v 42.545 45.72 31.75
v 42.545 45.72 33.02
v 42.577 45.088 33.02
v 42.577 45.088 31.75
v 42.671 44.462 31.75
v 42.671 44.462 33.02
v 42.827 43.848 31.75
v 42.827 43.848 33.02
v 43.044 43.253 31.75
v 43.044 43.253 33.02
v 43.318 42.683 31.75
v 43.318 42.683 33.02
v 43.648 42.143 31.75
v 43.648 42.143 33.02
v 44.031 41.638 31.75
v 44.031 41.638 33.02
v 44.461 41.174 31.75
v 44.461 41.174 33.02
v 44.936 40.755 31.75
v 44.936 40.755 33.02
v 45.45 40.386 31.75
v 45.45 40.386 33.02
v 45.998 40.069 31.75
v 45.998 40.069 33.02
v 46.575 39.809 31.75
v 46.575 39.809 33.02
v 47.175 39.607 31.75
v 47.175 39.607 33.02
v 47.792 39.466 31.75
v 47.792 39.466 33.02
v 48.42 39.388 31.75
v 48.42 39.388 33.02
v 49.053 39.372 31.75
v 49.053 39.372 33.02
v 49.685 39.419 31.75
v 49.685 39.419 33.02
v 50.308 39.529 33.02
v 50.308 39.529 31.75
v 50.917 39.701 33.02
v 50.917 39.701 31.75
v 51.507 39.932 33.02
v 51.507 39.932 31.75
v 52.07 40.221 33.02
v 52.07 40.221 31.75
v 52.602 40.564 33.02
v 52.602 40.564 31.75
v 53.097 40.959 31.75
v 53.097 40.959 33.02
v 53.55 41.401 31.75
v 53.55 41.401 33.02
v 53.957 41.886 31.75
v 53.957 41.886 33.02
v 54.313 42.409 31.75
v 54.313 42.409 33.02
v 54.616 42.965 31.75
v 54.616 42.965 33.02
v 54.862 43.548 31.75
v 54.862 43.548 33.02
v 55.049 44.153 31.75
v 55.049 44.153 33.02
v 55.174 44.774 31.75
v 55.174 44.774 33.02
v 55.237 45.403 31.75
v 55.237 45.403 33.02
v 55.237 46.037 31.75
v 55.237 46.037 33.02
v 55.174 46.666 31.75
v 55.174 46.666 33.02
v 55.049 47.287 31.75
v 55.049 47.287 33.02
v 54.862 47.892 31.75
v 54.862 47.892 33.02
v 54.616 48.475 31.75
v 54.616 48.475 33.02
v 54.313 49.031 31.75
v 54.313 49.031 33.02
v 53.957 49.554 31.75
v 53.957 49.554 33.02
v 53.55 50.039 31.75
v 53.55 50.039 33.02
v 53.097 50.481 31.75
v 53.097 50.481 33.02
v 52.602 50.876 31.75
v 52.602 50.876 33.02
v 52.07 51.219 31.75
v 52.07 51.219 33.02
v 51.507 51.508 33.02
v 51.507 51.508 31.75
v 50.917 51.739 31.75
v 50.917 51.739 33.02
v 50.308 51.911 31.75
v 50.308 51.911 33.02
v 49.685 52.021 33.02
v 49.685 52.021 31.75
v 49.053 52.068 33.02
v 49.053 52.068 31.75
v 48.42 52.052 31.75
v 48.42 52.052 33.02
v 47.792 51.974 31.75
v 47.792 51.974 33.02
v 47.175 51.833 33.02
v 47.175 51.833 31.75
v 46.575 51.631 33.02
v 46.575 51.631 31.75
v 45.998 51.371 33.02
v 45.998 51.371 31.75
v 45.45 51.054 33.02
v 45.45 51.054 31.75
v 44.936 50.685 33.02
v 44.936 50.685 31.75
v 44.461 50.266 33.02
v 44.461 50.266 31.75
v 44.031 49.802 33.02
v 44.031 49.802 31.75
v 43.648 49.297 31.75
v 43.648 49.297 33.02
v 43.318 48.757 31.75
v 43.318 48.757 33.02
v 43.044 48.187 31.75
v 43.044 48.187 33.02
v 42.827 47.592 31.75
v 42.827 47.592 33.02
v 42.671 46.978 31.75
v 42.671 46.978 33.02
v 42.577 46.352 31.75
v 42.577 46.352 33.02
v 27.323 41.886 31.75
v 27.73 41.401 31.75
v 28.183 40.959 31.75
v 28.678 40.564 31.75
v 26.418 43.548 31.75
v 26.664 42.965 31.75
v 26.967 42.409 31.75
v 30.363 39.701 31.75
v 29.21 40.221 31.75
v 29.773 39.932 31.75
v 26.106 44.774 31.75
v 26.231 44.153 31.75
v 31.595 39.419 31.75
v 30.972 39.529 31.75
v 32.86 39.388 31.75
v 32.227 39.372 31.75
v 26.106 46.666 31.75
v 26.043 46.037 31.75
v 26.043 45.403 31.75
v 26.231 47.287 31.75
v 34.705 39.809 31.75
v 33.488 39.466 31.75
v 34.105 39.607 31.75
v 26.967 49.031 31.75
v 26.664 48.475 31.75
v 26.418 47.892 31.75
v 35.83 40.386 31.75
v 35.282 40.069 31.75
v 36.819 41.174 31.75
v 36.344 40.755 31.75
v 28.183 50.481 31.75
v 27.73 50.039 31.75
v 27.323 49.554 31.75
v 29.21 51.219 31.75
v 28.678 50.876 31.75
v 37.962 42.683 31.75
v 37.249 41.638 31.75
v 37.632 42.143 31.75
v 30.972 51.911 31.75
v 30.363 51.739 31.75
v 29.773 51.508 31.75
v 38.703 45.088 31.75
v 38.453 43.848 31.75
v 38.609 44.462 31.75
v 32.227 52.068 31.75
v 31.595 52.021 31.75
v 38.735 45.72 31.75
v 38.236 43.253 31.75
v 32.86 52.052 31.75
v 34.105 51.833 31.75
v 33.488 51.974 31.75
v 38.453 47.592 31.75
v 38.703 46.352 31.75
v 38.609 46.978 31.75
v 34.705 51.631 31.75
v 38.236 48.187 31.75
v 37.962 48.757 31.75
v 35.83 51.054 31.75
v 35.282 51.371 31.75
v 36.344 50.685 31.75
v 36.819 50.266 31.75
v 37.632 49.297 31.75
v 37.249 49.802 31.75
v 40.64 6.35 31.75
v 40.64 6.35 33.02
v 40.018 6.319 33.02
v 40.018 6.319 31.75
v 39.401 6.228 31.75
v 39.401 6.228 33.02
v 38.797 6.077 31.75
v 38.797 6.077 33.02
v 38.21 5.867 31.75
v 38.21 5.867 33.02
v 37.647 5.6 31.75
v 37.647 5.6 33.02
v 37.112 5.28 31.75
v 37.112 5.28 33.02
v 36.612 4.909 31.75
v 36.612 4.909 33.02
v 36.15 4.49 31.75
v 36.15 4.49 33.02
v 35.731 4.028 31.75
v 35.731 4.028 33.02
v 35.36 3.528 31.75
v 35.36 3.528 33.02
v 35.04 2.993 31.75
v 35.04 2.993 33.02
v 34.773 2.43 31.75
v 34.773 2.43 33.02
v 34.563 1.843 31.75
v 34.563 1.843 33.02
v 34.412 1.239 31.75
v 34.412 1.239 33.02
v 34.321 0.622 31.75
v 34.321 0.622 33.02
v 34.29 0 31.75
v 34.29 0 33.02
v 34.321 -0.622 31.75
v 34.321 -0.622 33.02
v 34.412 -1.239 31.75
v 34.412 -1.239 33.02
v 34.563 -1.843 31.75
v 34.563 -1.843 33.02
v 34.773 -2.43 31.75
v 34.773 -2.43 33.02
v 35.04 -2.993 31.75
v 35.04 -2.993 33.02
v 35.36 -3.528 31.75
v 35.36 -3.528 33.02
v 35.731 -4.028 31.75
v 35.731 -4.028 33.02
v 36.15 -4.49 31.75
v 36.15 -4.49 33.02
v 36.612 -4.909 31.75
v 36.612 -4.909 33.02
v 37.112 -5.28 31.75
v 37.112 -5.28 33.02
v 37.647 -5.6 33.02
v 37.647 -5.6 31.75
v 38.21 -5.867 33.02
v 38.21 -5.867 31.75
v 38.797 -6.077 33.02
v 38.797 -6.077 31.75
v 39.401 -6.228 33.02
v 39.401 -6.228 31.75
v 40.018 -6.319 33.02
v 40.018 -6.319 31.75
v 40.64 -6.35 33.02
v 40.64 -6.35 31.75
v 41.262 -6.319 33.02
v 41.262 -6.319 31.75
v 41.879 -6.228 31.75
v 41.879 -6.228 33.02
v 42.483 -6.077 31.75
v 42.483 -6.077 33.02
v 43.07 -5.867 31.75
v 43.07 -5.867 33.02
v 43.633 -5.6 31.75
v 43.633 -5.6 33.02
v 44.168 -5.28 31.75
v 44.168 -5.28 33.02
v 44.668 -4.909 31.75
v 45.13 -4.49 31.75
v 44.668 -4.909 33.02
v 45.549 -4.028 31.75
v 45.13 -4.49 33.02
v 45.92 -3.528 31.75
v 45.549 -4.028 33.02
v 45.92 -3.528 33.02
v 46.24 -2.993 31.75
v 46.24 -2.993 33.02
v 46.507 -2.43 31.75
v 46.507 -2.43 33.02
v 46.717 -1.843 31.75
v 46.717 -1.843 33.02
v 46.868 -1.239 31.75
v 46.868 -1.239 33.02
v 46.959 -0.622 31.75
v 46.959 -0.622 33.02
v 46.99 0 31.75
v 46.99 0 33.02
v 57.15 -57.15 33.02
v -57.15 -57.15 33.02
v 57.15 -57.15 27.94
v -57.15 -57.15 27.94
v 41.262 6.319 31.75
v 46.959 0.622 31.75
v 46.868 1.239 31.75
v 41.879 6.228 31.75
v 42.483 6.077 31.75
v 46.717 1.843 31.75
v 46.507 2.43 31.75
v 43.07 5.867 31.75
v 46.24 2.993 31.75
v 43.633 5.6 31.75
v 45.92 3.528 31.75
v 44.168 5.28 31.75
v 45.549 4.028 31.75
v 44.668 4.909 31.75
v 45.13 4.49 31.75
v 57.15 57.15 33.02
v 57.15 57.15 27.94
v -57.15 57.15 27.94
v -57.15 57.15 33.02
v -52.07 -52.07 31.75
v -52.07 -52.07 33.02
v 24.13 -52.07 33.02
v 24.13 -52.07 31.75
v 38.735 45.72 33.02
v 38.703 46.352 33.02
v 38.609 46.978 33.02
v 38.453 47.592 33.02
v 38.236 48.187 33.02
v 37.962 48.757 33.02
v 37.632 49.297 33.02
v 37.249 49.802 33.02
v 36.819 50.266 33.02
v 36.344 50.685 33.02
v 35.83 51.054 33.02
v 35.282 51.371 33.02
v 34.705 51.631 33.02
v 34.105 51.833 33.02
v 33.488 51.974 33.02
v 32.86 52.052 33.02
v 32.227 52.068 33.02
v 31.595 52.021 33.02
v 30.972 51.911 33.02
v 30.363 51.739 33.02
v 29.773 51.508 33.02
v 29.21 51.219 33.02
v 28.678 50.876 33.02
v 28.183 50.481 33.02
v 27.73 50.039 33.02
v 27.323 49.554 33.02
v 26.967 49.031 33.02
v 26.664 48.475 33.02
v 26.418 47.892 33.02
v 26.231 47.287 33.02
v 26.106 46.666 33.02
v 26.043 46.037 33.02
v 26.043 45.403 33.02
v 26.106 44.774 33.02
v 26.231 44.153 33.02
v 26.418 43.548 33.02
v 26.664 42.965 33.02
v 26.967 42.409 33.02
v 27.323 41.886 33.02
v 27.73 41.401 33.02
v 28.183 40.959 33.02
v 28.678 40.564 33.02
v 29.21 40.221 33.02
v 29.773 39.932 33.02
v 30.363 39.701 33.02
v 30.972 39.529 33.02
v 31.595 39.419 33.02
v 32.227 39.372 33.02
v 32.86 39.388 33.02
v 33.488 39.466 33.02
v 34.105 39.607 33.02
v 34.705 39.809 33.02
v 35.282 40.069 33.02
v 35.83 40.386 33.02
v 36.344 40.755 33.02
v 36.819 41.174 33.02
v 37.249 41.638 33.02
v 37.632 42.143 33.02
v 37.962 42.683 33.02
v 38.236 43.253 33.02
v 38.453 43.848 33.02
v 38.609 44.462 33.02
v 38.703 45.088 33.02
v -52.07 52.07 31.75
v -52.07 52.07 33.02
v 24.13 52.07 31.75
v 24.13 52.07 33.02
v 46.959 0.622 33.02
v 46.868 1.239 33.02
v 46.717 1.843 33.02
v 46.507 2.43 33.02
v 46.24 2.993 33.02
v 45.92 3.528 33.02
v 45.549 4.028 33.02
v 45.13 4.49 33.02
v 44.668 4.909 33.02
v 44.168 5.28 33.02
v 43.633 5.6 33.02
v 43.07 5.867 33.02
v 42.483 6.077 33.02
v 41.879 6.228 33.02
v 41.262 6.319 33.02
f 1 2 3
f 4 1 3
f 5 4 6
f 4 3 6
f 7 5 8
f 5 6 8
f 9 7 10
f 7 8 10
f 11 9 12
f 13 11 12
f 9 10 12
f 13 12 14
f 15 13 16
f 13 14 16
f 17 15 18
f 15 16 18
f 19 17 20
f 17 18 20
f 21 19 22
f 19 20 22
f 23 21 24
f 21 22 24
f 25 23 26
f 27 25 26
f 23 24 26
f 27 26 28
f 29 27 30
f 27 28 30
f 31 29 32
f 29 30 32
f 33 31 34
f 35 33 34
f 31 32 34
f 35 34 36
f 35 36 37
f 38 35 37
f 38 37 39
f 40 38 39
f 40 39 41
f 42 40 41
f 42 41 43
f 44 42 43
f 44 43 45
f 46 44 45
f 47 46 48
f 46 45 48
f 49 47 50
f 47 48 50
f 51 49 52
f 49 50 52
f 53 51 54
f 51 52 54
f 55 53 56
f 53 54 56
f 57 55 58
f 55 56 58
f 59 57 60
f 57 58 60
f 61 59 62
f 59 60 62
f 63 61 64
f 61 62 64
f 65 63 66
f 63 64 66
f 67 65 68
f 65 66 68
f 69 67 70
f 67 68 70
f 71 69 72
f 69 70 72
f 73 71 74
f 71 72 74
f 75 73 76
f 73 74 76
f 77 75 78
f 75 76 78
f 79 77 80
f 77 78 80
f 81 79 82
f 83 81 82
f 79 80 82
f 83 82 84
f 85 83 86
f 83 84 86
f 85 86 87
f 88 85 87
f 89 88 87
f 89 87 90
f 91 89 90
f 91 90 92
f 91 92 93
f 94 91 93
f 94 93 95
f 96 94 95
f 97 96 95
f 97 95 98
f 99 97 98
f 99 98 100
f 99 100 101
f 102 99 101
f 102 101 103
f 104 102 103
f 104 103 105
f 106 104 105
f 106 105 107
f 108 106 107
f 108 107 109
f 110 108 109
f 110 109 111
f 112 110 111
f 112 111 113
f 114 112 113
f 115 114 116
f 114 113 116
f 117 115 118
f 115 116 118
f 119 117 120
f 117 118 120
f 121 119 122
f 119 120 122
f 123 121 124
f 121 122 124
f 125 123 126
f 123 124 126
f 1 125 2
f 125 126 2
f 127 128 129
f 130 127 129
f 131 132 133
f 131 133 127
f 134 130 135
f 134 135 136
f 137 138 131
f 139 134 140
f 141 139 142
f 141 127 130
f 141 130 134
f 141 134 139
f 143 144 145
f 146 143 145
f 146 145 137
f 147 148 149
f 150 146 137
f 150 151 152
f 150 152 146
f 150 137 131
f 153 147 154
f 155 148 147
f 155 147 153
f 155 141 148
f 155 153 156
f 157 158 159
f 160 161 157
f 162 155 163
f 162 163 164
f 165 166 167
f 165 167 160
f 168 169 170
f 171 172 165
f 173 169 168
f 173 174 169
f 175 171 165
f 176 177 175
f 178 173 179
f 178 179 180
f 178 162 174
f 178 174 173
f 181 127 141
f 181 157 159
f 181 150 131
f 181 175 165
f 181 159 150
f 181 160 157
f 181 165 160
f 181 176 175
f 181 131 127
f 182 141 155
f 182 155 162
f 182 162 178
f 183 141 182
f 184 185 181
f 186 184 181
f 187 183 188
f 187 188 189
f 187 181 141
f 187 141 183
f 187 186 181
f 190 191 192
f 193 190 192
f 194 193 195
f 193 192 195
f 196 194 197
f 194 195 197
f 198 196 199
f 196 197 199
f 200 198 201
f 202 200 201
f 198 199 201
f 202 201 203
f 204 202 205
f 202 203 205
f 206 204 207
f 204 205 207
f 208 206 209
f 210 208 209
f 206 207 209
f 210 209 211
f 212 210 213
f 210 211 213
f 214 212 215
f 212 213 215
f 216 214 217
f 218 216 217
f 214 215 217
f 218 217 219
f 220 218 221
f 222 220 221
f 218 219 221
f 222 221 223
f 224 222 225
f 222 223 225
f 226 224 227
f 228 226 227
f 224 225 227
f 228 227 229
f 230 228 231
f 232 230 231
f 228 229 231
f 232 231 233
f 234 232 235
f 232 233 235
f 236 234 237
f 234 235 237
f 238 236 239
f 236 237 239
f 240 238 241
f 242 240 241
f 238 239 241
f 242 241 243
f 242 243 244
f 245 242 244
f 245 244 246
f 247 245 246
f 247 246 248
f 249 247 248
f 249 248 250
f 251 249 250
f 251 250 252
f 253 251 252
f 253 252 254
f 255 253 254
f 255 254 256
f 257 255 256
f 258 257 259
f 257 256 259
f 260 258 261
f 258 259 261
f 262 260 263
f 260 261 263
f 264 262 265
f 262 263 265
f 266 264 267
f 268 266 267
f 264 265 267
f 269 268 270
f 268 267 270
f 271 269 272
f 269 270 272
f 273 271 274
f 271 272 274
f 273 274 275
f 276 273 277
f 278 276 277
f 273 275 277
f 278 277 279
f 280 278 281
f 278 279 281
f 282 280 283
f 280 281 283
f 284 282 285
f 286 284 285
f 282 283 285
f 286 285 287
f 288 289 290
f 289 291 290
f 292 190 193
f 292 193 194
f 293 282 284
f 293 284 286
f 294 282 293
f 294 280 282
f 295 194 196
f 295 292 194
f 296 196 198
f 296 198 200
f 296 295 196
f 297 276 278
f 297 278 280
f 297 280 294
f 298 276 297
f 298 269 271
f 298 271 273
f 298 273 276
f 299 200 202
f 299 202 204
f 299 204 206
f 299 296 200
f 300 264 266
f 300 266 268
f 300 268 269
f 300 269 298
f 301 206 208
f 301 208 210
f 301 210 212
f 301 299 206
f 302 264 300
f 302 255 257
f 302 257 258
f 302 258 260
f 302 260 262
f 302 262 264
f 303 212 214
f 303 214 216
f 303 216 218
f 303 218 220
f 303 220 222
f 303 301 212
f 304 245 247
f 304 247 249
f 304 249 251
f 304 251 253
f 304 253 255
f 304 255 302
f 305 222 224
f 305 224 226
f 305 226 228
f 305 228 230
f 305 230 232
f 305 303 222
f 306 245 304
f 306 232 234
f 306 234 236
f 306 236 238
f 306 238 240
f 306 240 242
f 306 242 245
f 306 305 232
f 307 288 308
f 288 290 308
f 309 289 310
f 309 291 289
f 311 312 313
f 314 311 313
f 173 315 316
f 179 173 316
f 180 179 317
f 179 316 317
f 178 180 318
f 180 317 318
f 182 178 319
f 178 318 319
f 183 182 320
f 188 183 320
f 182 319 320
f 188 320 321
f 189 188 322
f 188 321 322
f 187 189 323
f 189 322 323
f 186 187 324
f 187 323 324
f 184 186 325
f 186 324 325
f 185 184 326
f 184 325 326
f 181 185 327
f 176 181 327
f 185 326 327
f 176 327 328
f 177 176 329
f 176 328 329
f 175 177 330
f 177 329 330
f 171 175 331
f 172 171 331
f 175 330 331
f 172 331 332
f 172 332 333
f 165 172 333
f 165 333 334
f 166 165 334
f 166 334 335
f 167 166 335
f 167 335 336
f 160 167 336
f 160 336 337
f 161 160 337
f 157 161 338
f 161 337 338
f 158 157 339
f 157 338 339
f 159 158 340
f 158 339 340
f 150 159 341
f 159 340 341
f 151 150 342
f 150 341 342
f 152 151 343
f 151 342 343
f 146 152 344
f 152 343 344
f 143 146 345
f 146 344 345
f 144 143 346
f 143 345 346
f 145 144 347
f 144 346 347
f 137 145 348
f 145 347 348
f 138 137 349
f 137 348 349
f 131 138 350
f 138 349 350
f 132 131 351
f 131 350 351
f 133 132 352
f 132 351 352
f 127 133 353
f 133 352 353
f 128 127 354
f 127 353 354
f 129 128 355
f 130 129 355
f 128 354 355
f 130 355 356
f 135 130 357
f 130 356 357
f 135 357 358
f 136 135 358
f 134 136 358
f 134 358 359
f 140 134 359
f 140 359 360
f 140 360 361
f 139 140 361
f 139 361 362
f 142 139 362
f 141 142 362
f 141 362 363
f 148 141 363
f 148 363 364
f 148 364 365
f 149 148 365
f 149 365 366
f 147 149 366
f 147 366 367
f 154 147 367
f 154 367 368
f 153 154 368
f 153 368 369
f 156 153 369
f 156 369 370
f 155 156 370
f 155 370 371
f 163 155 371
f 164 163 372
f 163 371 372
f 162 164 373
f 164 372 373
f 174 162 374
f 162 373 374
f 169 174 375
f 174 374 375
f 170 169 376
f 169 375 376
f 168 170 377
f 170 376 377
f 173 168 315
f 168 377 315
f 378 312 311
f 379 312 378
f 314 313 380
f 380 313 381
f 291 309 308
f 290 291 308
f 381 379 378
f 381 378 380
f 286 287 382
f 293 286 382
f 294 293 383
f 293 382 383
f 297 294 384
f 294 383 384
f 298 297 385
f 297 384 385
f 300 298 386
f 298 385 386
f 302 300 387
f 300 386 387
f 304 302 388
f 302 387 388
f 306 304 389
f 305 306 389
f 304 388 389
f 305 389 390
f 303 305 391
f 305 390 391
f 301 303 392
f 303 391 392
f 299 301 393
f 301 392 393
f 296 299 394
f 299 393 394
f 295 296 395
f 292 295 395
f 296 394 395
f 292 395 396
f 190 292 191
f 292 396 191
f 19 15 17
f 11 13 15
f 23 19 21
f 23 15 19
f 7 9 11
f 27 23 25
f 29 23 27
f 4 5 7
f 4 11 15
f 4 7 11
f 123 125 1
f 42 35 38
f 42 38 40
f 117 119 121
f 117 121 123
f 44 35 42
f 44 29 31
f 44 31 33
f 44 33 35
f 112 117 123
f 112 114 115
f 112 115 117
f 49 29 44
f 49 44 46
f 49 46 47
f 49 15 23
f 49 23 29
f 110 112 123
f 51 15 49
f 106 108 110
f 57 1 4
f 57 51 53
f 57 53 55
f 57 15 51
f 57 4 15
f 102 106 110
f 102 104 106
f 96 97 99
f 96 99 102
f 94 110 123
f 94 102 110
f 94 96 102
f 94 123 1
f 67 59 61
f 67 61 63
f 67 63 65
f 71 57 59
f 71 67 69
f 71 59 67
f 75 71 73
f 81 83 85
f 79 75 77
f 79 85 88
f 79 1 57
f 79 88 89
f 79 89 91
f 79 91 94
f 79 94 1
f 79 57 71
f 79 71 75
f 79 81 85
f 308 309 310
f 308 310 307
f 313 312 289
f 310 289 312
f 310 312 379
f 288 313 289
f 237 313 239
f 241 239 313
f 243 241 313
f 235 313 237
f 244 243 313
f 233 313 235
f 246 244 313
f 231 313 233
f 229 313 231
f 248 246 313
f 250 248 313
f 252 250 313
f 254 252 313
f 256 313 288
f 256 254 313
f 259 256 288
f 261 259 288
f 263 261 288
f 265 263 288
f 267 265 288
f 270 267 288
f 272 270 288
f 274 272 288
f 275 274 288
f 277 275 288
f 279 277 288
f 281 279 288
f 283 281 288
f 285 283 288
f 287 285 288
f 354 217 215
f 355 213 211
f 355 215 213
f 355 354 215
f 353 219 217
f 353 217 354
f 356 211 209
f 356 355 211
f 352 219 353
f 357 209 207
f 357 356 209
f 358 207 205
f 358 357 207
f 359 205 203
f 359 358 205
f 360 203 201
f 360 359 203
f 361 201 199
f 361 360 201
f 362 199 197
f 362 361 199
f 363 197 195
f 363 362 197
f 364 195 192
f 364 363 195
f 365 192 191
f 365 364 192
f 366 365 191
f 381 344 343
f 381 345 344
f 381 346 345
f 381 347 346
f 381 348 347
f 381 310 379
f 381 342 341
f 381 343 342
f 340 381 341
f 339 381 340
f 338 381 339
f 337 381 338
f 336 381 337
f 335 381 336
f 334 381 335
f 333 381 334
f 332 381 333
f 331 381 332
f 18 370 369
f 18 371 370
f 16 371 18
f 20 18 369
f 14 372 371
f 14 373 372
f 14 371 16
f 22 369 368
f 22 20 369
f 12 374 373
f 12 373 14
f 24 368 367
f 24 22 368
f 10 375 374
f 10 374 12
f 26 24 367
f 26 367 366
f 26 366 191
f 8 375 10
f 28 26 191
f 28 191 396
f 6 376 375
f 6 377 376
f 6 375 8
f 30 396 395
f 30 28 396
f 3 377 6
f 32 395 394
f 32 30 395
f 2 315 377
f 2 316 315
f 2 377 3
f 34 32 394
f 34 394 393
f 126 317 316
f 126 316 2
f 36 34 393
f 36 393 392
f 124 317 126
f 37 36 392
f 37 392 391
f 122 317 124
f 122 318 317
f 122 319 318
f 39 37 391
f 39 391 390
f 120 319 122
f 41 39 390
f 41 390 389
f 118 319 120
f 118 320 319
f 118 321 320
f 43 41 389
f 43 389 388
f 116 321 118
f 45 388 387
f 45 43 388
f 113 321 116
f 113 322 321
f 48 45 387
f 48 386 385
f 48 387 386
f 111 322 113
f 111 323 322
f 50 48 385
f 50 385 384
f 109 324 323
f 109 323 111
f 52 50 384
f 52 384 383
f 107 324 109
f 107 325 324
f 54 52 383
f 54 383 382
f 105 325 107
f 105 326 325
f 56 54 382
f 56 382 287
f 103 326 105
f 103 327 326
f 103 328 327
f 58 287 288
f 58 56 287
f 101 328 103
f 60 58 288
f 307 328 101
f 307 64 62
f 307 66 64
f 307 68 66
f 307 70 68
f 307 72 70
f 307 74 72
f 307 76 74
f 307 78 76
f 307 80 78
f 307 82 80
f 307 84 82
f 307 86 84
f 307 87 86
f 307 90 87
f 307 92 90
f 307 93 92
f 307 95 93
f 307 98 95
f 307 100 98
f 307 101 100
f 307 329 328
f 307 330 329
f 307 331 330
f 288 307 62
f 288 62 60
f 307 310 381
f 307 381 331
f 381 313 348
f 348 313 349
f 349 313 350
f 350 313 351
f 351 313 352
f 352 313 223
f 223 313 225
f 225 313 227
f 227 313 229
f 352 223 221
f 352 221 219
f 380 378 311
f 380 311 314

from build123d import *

# Parameters (mm, degrees)
F0_W      = 114.3
F0_H      = 114.3
F1_DEPTH  = 2.54
F8_W      = 114.3
F8_H      = 114.3
F9_DEPTH  = 2.54
F10_W     = 114.3
F10_H     = 114.3
F11_DEPTH = 2.54
F12_W     = 76.2
F12_H     = 104.14
F13_DEPTH = 1.27
F14_R     = 6.35
F15_DEPTH = 1.27
F17_W     = 111.252
F17_H     = 111.252
F18_DEPTH = 1.905


# Not quite as in the source:
# - a feature of the source that left no trace in its solid (it failed there, or was rolled back) is left out


with BuildPart() as f1:
    # F0 (on Top) → F1 (new body)
    with BuildSketch(Plane.XY):
        Rectangle(F0_W, F0_H)
    extrude(amount=F1_DEPTH)


with BuildPart() as f9:
    # F8 (on face) → F9 (new body)
    with BuildSketch(Plane.XY.offset(27.94)):
        Rectangle(F8_W, F8_H)
    extrude(amount=F9_DEPTH)

    # F10 (on face) → F11 (join)
    with BuildSketch(Plane.XY.offset(30.48)):
        Rectangle(F10_W, F10_H)
    extrude(amount=F11_DEPTH)

    # F12 (on face) → F13 (cut)
    with BuildSketch(Plane.XY.offset(33.02)):
        with Locations((-13.97, 0)):
            Rectangle(F12_W, F12_H)
    extrude(amount=-F13_DEPTH, mode=Mode.SUBTRACT)

    # F14 (on face) → F15 (cut)
    with BuildSketch(Plane.XY.offset(33.02)):
        with BuildLine():
            ThreePointArc((55.245, 45.72), (48.895, 52.07), (42.545, 45.72))
            ThreePointArc((42.545, 45.72), (48.895, 39.37), (55.245, 45.72))
        make_face()
        with Locations((32.385, 45.72)):
            Circle(F14_R)
        with BuildLine():
            ThreePointArc((40.64, 6.35), (36.1498719395, -4.4901280605), (46.99, 0))
            ThreePointArc((46.99, 0), (45.1301280605, 4.4901280605), (40.64, 6.35))
        make_face()
    extrude(amount=-F15_DEPTH, mode=Mode.SUBTRACT)


with BuildPart() as f18:
    # F17 (on face) → F18 (new body)
    with BuildSketch(Plane(origin=(0, 0, 27.94), x_dir=(1, 0, 0), z_dir=(0, 0, -1))):
        Rectangle(F17_W, F17_H)
    extrude(amount=F18_DEPTH)


solid = f9.part
